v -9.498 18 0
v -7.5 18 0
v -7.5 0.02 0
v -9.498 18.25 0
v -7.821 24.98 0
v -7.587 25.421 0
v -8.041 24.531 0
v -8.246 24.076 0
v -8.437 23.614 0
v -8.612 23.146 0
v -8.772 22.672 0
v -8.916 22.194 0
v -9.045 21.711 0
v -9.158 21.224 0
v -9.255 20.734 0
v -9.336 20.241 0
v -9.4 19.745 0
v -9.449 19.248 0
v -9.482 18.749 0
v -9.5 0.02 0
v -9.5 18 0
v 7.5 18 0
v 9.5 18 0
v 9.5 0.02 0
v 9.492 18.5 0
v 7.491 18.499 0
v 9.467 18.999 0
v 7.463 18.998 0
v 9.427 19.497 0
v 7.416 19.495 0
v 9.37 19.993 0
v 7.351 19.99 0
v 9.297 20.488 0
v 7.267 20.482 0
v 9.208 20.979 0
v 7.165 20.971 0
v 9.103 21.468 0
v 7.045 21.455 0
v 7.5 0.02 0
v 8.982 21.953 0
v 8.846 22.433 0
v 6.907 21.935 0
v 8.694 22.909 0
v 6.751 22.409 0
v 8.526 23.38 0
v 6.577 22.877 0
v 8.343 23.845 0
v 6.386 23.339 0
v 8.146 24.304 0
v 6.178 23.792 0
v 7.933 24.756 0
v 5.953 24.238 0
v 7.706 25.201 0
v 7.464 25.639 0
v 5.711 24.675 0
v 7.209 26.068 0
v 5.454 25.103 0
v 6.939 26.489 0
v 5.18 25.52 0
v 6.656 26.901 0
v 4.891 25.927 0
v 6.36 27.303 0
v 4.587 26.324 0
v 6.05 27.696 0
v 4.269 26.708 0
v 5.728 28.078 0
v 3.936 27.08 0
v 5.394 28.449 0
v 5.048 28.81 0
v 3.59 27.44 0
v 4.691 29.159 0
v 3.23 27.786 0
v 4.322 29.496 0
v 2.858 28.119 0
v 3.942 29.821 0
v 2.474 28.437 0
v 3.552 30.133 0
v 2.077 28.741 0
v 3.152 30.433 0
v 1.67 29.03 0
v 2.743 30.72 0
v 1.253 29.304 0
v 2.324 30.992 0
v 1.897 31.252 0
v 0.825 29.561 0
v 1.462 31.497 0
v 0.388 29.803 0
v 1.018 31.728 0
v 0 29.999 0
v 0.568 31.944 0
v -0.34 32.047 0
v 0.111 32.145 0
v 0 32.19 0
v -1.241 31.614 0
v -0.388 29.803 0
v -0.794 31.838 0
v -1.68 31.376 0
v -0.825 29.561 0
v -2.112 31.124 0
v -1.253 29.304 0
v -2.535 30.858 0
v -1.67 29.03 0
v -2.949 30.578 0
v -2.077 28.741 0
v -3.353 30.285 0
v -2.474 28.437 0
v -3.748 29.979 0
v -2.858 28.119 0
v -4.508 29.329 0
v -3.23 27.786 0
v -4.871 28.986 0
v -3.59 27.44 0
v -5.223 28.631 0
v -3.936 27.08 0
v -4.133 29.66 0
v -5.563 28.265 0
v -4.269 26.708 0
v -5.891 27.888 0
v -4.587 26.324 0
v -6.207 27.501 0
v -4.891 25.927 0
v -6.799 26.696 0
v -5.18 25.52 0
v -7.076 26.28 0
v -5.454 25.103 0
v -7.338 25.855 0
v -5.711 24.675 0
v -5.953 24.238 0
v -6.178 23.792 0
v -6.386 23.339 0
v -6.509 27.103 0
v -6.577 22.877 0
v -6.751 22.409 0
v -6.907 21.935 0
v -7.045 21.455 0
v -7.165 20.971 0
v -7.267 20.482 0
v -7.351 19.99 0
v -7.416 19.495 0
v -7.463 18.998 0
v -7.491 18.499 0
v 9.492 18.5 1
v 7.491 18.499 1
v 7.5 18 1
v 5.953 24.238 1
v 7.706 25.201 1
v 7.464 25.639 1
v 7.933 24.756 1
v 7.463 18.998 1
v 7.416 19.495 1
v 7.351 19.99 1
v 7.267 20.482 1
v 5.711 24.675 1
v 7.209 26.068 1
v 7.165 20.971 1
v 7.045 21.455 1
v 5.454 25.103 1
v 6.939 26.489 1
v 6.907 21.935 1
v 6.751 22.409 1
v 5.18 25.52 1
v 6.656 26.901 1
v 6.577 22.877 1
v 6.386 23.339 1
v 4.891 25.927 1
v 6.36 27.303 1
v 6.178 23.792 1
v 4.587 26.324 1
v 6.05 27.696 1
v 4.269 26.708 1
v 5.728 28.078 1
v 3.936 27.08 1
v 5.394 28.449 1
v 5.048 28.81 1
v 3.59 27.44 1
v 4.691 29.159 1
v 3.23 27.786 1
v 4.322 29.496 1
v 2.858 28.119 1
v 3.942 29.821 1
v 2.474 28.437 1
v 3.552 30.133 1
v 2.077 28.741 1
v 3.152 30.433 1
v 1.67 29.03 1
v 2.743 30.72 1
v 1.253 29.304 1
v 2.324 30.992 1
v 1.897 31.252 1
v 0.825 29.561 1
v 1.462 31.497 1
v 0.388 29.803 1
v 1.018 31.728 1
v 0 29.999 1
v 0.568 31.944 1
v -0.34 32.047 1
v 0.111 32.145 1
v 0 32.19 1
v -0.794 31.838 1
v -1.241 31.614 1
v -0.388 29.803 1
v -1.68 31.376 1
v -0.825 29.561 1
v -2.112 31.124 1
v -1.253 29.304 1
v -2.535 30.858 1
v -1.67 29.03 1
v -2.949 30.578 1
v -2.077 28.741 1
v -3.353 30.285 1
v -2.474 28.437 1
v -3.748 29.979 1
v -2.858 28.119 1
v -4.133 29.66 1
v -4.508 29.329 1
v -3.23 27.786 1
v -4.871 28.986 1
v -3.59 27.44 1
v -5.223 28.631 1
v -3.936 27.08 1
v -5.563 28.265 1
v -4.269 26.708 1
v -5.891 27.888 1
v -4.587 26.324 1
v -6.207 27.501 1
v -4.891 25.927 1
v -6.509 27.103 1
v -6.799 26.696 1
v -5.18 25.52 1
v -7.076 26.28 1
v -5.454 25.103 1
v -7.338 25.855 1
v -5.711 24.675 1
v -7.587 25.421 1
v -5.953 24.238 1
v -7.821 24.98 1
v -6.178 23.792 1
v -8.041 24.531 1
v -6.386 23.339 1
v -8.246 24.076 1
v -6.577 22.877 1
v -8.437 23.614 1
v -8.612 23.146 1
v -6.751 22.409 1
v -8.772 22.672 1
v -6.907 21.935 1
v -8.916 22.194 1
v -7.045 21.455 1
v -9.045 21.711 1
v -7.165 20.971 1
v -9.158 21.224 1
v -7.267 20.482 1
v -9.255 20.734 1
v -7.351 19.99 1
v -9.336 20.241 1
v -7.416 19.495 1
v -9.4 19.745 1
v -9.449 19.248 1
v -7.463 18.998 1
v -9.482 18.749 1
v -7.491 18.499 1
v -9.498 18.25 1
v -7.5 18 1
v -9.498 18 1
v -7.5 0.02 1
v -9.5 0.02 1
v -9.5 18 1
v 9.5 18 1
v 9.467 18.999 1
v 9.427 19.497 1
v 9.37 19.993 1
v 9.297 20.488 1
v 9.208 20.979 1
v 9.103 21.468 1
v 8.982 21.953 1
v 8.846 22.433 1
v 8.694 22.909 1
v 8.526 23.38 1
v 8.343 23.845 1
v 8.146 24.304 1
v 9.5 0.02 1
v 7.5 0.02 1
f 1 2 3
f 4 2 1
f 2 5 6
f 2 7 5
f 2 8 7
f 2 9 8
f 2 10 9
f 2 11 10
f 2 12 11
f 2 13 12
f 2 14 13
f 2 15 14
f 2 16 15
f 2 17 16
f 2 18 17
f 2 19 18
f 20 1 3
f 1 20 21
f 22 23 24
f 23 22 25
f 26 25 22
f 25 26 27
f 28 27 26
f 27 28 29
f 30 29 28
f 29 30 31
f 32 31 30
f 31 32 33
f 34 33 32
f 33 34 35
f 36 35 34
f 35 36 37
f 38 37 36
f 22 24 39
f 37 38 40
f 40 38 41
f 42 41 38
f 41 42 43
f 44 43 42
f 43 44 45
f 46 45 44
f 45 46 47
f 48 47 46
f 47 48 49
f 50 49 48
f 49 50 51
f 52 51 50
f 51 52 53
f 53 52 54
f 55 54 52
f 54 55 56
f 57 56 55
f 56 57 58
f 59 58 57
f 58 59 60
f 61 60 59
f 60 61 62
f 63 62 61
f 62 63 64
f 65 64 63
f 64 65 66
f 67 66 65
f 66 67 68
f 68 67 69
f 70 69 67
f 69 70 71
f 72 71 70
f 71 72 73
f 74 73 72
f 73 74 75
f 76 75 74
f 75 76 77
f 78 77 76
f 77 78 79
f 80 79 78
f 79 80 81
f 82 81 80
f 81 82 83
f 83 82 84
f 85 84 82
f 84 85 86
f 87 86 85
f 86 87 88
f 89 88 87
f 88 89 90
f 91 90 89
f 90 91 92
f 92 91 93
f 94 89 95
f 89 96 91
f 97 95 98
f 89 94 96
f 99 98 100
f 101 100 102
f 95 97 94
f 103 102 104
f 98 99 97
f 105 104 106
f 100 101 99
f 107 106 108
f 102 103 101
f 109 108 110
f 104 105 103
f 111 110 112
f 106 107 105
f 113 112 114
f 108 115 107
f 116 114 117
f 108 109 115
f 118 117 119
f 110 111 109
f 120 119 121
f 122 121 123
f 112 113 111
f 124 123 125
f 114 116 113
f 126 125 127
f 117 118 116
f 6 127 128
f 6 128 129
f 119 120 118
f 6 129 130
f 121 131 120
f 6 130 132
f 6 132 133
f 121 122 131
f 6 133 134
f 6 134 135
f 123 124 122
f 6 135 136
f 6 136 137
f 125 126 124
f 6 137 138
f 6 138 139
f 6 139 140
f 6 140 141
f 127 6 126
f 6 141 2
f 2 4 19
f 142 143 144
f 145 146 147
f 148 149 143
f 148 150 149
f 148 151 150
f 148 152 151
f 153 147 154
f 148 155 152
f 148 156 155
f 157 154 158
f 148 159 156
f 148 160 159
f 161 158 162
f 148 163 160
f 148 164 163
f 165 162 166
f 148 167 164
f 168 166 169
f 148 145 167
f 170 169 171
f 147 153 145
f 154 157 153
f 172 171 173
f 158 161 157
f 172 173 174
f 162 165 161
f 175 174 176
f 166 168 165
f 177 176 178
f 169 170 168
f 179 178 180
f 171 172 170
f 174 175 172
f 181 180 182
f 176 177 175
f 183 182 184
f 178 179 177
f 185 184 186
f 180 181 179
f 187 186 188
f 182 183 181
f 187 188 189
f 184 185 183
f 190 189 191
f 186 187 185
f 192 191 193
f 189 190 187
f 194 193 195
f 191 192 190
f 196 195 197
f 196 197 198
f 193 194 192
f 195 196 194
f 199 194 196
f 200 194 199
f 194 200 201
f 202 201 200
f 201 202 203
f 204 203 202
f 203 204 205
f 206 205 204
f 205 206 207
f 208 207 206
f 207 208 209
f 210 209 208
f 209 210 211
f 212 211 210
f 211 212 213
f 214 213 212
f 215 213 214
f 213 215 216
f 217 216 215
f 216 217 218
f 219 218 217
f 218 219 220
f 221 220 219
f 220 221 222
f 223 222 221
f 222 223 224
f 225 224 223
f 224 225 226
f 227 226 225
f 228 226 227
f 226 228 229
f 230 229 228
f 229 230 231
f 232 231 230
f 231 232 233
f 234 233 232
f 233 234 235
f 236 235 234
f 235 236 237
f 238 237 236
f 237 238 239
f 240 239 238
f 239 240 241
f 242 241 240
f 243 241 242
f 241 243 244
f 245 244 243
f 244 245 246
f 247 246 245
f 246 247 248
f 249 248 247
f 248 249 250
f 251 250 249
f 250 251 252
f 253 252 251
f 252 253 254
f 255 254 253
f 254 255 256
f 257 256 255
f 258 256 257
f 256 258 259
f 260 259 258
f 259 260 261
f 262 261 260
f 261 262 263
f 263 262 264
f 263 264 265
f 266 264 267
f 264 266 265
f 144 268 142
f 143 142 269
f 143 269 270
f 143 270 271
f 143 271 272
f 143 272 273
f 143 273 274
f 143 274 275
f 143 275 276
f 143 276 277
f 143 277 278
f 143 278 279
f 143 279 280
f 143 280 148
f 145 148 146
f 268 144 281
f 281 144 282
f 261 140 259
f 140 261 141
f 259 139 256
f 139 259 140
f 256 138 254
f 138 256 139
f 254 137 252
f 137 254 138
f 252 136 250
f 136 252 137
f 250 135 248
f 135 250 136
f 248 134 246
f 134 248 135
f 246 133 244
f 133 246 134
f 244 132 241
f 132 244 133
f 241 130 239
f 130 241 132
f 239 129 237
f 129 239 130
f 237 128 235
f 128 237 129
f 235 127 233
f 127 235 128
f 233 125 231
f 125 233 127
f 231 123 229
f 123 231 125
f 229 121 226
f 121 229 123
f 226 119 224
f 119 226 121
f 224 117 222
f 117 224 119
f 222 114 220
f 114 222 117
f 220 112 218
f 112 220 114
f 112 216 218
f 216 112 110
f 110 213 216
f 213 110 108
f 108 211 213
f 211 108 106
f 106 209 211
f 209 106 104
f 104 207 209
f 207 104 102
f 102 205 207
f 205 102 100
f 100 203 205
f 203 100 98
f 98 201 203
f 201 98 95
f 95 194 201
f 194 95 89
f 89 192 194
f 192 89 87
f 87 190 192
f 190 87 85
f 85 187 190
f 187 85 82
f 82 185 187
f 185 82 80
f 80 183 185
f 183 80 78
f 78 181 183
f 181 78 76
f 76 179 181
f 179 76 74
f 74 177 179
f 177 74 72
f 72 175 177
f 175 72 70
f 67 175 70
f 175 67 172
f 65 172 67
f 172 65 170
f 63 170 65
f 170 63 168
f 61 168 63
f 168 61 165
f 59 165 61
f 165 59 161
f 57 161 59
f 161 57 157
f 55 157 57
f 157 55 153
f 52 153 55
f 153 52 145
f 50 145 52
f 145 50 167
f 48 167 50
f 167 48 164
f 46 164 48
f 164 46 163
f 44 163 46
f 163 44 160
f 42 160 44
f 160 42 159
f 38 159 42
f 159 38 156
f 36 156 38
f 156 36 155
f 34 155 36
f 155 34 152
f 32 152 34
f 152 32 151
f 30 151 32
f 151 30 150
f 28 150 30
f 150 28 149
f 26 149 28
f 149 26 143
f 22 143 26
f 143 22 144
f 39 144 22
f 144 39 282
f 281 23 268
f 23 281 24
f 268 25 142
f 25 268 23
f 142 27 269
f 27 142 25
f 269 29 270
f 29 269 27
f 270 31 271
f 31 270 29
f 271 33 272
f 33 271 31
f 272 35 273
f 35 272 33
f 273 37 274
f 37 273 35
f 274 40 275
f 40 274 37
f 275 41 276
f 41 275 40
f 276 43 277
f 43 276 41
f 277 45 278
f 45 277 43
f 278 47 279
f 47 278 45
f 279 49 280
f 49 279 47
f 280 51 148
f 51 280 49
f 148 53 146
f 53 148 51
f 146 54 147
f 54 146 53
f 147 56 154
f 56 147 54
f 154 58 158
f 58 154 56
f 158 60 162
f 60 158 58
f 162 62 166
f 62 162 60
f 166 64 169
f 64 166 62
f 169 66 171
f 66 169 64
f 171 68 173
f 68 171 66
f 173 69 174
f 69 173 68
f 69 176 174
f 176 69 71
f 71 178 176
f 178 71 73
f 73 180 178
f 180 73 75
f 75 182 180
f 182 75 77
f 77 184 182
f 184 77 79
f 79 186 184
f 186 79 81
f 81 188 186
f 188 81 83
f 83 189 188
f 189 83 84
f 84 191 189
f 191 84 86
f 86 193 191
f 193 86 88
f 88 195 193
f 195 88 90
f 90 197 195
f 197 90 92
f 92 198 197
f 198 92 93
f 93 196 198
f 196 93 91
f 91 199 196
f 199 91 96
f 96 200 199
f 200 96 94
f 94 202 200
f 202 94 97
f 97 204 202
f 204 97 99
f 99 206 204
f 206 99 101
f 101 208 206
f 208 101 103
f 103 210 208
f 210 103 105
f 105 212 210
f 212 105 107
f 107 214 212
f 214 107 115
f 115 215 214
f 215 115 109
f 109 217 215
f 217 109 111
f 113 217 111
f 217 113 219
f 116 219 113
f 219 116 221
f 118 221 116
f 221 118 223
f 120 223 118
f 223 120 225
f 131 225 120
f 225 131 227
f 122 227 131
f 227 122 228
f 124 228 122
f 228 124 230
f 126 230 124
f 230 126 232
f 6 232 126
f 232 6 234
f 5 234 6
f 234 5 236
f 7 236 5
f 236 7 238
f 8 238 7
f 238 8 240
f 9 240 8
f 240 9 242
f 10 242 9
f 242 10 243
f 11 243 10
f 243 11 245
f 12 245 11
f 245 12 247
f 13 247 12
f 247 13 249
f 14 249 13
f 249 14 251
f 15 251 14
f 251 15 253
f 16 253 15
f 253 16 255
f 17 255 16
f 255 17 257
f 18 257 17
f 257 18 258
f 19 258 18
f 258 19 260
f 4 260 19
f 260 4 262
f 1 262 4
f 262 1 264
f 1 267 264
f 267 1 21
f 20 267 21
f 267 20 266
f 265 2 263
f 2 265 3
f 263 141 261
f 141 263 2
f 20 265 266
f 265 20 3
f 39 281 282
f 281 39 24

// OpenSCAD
function v_sum_r(v,n,k) =
      k > n ? 0 : v[k] + v_sum_r(v,n,k+1);

function v_sum(v,n) = v_sum_r(v,n-1,0);

// compute the x,y and r parameters for an arch with a given width,height
//  and sharpness 
//  messy code because function body is very restricted
// return array [x,y,r]

function ogive_r(w,h,s) =
       (pow(w/2,2) + pow(w * s,2) )/ w;
function ogive(w,h,s) =
       [ogive_r(w,h,s) - (w/2), h - w * s, ogive_r(w,h,s)];

// construct arch 
module arch(x,y,r) {
      union() {
        intersection () {
           translate([x,y,0]) circle(r);
           translate([-x,y,0]) circle(r);
      }
      translate([0,y/2,0]) square(size=[2 *(r-x), y],center=true);
  }
}

delta=1;

module archway_out(x,y,r,t,d) { 
  linear_extrude(height=d)
     difference () {
         arch(x,y,r+t,d);
         translate([0,0,-delta]) arch(x,y,r,d+2*delta);
  }
}

module archway_in(x,y,r,t,d) {
  linear_extrude(height=d)
     difference () {
         arch(x,y,r,d);
         translate([0,0,-delta]) arch(x,y,r-t,d+2*delta);
  }
}

module nested_archway_xy_out (x,y,r,t,d,n) {
  union() {
       for (i=[1:n]) {
          assign(dt =  v_sum(t,i-1)) {
              echo(t[i-1],dt);
              archway_out(x,y,r+dt, t[i-1],d[i-1]);
         }
    }
  }
}

module nested_archway_xy_in (x,y,r,t,d,n) {
  union() {
       for (i=[1:n]) {
          assign(dt =  v_sum(t,i-1)) {
              echo(t[i-1],dt);
              archway_in(x,y,r-dt,t[i-1],d[i-1]);
         }
    }
  }
}

module nested_archway_out(width,height,sharpness,thickness,depth,n) {
    assign(p = ogive(width,height,sharpness))
    nested_archway_xy_out(p[0],p[1],p[2],thickness,depth,n);
}

module nested_archway_in(width,height,sharpness,thickness,depth,n) {
    assign(p = ogive(width,height,sharpness))
    nested_archway_xy_in(p[0],p[1],p[2],thickness,depth,n);
}

module remove_ground() {
   difference()  {
     child(0);
     translate([0,-49.98,0]) cube([100,100,100],center=true);
  }
}

$fa = 0.01; $fs = 0.5; 

remove_ground () 
    nested_archway_out(15,30,0.8,[2,4,2,4],[1,3,5,7],4);

*translate([0,0,150])
  remove_ground () 
    nested_archway_in(20,40,0.8,[2,1,3,1],[4,3,2,1],4);
